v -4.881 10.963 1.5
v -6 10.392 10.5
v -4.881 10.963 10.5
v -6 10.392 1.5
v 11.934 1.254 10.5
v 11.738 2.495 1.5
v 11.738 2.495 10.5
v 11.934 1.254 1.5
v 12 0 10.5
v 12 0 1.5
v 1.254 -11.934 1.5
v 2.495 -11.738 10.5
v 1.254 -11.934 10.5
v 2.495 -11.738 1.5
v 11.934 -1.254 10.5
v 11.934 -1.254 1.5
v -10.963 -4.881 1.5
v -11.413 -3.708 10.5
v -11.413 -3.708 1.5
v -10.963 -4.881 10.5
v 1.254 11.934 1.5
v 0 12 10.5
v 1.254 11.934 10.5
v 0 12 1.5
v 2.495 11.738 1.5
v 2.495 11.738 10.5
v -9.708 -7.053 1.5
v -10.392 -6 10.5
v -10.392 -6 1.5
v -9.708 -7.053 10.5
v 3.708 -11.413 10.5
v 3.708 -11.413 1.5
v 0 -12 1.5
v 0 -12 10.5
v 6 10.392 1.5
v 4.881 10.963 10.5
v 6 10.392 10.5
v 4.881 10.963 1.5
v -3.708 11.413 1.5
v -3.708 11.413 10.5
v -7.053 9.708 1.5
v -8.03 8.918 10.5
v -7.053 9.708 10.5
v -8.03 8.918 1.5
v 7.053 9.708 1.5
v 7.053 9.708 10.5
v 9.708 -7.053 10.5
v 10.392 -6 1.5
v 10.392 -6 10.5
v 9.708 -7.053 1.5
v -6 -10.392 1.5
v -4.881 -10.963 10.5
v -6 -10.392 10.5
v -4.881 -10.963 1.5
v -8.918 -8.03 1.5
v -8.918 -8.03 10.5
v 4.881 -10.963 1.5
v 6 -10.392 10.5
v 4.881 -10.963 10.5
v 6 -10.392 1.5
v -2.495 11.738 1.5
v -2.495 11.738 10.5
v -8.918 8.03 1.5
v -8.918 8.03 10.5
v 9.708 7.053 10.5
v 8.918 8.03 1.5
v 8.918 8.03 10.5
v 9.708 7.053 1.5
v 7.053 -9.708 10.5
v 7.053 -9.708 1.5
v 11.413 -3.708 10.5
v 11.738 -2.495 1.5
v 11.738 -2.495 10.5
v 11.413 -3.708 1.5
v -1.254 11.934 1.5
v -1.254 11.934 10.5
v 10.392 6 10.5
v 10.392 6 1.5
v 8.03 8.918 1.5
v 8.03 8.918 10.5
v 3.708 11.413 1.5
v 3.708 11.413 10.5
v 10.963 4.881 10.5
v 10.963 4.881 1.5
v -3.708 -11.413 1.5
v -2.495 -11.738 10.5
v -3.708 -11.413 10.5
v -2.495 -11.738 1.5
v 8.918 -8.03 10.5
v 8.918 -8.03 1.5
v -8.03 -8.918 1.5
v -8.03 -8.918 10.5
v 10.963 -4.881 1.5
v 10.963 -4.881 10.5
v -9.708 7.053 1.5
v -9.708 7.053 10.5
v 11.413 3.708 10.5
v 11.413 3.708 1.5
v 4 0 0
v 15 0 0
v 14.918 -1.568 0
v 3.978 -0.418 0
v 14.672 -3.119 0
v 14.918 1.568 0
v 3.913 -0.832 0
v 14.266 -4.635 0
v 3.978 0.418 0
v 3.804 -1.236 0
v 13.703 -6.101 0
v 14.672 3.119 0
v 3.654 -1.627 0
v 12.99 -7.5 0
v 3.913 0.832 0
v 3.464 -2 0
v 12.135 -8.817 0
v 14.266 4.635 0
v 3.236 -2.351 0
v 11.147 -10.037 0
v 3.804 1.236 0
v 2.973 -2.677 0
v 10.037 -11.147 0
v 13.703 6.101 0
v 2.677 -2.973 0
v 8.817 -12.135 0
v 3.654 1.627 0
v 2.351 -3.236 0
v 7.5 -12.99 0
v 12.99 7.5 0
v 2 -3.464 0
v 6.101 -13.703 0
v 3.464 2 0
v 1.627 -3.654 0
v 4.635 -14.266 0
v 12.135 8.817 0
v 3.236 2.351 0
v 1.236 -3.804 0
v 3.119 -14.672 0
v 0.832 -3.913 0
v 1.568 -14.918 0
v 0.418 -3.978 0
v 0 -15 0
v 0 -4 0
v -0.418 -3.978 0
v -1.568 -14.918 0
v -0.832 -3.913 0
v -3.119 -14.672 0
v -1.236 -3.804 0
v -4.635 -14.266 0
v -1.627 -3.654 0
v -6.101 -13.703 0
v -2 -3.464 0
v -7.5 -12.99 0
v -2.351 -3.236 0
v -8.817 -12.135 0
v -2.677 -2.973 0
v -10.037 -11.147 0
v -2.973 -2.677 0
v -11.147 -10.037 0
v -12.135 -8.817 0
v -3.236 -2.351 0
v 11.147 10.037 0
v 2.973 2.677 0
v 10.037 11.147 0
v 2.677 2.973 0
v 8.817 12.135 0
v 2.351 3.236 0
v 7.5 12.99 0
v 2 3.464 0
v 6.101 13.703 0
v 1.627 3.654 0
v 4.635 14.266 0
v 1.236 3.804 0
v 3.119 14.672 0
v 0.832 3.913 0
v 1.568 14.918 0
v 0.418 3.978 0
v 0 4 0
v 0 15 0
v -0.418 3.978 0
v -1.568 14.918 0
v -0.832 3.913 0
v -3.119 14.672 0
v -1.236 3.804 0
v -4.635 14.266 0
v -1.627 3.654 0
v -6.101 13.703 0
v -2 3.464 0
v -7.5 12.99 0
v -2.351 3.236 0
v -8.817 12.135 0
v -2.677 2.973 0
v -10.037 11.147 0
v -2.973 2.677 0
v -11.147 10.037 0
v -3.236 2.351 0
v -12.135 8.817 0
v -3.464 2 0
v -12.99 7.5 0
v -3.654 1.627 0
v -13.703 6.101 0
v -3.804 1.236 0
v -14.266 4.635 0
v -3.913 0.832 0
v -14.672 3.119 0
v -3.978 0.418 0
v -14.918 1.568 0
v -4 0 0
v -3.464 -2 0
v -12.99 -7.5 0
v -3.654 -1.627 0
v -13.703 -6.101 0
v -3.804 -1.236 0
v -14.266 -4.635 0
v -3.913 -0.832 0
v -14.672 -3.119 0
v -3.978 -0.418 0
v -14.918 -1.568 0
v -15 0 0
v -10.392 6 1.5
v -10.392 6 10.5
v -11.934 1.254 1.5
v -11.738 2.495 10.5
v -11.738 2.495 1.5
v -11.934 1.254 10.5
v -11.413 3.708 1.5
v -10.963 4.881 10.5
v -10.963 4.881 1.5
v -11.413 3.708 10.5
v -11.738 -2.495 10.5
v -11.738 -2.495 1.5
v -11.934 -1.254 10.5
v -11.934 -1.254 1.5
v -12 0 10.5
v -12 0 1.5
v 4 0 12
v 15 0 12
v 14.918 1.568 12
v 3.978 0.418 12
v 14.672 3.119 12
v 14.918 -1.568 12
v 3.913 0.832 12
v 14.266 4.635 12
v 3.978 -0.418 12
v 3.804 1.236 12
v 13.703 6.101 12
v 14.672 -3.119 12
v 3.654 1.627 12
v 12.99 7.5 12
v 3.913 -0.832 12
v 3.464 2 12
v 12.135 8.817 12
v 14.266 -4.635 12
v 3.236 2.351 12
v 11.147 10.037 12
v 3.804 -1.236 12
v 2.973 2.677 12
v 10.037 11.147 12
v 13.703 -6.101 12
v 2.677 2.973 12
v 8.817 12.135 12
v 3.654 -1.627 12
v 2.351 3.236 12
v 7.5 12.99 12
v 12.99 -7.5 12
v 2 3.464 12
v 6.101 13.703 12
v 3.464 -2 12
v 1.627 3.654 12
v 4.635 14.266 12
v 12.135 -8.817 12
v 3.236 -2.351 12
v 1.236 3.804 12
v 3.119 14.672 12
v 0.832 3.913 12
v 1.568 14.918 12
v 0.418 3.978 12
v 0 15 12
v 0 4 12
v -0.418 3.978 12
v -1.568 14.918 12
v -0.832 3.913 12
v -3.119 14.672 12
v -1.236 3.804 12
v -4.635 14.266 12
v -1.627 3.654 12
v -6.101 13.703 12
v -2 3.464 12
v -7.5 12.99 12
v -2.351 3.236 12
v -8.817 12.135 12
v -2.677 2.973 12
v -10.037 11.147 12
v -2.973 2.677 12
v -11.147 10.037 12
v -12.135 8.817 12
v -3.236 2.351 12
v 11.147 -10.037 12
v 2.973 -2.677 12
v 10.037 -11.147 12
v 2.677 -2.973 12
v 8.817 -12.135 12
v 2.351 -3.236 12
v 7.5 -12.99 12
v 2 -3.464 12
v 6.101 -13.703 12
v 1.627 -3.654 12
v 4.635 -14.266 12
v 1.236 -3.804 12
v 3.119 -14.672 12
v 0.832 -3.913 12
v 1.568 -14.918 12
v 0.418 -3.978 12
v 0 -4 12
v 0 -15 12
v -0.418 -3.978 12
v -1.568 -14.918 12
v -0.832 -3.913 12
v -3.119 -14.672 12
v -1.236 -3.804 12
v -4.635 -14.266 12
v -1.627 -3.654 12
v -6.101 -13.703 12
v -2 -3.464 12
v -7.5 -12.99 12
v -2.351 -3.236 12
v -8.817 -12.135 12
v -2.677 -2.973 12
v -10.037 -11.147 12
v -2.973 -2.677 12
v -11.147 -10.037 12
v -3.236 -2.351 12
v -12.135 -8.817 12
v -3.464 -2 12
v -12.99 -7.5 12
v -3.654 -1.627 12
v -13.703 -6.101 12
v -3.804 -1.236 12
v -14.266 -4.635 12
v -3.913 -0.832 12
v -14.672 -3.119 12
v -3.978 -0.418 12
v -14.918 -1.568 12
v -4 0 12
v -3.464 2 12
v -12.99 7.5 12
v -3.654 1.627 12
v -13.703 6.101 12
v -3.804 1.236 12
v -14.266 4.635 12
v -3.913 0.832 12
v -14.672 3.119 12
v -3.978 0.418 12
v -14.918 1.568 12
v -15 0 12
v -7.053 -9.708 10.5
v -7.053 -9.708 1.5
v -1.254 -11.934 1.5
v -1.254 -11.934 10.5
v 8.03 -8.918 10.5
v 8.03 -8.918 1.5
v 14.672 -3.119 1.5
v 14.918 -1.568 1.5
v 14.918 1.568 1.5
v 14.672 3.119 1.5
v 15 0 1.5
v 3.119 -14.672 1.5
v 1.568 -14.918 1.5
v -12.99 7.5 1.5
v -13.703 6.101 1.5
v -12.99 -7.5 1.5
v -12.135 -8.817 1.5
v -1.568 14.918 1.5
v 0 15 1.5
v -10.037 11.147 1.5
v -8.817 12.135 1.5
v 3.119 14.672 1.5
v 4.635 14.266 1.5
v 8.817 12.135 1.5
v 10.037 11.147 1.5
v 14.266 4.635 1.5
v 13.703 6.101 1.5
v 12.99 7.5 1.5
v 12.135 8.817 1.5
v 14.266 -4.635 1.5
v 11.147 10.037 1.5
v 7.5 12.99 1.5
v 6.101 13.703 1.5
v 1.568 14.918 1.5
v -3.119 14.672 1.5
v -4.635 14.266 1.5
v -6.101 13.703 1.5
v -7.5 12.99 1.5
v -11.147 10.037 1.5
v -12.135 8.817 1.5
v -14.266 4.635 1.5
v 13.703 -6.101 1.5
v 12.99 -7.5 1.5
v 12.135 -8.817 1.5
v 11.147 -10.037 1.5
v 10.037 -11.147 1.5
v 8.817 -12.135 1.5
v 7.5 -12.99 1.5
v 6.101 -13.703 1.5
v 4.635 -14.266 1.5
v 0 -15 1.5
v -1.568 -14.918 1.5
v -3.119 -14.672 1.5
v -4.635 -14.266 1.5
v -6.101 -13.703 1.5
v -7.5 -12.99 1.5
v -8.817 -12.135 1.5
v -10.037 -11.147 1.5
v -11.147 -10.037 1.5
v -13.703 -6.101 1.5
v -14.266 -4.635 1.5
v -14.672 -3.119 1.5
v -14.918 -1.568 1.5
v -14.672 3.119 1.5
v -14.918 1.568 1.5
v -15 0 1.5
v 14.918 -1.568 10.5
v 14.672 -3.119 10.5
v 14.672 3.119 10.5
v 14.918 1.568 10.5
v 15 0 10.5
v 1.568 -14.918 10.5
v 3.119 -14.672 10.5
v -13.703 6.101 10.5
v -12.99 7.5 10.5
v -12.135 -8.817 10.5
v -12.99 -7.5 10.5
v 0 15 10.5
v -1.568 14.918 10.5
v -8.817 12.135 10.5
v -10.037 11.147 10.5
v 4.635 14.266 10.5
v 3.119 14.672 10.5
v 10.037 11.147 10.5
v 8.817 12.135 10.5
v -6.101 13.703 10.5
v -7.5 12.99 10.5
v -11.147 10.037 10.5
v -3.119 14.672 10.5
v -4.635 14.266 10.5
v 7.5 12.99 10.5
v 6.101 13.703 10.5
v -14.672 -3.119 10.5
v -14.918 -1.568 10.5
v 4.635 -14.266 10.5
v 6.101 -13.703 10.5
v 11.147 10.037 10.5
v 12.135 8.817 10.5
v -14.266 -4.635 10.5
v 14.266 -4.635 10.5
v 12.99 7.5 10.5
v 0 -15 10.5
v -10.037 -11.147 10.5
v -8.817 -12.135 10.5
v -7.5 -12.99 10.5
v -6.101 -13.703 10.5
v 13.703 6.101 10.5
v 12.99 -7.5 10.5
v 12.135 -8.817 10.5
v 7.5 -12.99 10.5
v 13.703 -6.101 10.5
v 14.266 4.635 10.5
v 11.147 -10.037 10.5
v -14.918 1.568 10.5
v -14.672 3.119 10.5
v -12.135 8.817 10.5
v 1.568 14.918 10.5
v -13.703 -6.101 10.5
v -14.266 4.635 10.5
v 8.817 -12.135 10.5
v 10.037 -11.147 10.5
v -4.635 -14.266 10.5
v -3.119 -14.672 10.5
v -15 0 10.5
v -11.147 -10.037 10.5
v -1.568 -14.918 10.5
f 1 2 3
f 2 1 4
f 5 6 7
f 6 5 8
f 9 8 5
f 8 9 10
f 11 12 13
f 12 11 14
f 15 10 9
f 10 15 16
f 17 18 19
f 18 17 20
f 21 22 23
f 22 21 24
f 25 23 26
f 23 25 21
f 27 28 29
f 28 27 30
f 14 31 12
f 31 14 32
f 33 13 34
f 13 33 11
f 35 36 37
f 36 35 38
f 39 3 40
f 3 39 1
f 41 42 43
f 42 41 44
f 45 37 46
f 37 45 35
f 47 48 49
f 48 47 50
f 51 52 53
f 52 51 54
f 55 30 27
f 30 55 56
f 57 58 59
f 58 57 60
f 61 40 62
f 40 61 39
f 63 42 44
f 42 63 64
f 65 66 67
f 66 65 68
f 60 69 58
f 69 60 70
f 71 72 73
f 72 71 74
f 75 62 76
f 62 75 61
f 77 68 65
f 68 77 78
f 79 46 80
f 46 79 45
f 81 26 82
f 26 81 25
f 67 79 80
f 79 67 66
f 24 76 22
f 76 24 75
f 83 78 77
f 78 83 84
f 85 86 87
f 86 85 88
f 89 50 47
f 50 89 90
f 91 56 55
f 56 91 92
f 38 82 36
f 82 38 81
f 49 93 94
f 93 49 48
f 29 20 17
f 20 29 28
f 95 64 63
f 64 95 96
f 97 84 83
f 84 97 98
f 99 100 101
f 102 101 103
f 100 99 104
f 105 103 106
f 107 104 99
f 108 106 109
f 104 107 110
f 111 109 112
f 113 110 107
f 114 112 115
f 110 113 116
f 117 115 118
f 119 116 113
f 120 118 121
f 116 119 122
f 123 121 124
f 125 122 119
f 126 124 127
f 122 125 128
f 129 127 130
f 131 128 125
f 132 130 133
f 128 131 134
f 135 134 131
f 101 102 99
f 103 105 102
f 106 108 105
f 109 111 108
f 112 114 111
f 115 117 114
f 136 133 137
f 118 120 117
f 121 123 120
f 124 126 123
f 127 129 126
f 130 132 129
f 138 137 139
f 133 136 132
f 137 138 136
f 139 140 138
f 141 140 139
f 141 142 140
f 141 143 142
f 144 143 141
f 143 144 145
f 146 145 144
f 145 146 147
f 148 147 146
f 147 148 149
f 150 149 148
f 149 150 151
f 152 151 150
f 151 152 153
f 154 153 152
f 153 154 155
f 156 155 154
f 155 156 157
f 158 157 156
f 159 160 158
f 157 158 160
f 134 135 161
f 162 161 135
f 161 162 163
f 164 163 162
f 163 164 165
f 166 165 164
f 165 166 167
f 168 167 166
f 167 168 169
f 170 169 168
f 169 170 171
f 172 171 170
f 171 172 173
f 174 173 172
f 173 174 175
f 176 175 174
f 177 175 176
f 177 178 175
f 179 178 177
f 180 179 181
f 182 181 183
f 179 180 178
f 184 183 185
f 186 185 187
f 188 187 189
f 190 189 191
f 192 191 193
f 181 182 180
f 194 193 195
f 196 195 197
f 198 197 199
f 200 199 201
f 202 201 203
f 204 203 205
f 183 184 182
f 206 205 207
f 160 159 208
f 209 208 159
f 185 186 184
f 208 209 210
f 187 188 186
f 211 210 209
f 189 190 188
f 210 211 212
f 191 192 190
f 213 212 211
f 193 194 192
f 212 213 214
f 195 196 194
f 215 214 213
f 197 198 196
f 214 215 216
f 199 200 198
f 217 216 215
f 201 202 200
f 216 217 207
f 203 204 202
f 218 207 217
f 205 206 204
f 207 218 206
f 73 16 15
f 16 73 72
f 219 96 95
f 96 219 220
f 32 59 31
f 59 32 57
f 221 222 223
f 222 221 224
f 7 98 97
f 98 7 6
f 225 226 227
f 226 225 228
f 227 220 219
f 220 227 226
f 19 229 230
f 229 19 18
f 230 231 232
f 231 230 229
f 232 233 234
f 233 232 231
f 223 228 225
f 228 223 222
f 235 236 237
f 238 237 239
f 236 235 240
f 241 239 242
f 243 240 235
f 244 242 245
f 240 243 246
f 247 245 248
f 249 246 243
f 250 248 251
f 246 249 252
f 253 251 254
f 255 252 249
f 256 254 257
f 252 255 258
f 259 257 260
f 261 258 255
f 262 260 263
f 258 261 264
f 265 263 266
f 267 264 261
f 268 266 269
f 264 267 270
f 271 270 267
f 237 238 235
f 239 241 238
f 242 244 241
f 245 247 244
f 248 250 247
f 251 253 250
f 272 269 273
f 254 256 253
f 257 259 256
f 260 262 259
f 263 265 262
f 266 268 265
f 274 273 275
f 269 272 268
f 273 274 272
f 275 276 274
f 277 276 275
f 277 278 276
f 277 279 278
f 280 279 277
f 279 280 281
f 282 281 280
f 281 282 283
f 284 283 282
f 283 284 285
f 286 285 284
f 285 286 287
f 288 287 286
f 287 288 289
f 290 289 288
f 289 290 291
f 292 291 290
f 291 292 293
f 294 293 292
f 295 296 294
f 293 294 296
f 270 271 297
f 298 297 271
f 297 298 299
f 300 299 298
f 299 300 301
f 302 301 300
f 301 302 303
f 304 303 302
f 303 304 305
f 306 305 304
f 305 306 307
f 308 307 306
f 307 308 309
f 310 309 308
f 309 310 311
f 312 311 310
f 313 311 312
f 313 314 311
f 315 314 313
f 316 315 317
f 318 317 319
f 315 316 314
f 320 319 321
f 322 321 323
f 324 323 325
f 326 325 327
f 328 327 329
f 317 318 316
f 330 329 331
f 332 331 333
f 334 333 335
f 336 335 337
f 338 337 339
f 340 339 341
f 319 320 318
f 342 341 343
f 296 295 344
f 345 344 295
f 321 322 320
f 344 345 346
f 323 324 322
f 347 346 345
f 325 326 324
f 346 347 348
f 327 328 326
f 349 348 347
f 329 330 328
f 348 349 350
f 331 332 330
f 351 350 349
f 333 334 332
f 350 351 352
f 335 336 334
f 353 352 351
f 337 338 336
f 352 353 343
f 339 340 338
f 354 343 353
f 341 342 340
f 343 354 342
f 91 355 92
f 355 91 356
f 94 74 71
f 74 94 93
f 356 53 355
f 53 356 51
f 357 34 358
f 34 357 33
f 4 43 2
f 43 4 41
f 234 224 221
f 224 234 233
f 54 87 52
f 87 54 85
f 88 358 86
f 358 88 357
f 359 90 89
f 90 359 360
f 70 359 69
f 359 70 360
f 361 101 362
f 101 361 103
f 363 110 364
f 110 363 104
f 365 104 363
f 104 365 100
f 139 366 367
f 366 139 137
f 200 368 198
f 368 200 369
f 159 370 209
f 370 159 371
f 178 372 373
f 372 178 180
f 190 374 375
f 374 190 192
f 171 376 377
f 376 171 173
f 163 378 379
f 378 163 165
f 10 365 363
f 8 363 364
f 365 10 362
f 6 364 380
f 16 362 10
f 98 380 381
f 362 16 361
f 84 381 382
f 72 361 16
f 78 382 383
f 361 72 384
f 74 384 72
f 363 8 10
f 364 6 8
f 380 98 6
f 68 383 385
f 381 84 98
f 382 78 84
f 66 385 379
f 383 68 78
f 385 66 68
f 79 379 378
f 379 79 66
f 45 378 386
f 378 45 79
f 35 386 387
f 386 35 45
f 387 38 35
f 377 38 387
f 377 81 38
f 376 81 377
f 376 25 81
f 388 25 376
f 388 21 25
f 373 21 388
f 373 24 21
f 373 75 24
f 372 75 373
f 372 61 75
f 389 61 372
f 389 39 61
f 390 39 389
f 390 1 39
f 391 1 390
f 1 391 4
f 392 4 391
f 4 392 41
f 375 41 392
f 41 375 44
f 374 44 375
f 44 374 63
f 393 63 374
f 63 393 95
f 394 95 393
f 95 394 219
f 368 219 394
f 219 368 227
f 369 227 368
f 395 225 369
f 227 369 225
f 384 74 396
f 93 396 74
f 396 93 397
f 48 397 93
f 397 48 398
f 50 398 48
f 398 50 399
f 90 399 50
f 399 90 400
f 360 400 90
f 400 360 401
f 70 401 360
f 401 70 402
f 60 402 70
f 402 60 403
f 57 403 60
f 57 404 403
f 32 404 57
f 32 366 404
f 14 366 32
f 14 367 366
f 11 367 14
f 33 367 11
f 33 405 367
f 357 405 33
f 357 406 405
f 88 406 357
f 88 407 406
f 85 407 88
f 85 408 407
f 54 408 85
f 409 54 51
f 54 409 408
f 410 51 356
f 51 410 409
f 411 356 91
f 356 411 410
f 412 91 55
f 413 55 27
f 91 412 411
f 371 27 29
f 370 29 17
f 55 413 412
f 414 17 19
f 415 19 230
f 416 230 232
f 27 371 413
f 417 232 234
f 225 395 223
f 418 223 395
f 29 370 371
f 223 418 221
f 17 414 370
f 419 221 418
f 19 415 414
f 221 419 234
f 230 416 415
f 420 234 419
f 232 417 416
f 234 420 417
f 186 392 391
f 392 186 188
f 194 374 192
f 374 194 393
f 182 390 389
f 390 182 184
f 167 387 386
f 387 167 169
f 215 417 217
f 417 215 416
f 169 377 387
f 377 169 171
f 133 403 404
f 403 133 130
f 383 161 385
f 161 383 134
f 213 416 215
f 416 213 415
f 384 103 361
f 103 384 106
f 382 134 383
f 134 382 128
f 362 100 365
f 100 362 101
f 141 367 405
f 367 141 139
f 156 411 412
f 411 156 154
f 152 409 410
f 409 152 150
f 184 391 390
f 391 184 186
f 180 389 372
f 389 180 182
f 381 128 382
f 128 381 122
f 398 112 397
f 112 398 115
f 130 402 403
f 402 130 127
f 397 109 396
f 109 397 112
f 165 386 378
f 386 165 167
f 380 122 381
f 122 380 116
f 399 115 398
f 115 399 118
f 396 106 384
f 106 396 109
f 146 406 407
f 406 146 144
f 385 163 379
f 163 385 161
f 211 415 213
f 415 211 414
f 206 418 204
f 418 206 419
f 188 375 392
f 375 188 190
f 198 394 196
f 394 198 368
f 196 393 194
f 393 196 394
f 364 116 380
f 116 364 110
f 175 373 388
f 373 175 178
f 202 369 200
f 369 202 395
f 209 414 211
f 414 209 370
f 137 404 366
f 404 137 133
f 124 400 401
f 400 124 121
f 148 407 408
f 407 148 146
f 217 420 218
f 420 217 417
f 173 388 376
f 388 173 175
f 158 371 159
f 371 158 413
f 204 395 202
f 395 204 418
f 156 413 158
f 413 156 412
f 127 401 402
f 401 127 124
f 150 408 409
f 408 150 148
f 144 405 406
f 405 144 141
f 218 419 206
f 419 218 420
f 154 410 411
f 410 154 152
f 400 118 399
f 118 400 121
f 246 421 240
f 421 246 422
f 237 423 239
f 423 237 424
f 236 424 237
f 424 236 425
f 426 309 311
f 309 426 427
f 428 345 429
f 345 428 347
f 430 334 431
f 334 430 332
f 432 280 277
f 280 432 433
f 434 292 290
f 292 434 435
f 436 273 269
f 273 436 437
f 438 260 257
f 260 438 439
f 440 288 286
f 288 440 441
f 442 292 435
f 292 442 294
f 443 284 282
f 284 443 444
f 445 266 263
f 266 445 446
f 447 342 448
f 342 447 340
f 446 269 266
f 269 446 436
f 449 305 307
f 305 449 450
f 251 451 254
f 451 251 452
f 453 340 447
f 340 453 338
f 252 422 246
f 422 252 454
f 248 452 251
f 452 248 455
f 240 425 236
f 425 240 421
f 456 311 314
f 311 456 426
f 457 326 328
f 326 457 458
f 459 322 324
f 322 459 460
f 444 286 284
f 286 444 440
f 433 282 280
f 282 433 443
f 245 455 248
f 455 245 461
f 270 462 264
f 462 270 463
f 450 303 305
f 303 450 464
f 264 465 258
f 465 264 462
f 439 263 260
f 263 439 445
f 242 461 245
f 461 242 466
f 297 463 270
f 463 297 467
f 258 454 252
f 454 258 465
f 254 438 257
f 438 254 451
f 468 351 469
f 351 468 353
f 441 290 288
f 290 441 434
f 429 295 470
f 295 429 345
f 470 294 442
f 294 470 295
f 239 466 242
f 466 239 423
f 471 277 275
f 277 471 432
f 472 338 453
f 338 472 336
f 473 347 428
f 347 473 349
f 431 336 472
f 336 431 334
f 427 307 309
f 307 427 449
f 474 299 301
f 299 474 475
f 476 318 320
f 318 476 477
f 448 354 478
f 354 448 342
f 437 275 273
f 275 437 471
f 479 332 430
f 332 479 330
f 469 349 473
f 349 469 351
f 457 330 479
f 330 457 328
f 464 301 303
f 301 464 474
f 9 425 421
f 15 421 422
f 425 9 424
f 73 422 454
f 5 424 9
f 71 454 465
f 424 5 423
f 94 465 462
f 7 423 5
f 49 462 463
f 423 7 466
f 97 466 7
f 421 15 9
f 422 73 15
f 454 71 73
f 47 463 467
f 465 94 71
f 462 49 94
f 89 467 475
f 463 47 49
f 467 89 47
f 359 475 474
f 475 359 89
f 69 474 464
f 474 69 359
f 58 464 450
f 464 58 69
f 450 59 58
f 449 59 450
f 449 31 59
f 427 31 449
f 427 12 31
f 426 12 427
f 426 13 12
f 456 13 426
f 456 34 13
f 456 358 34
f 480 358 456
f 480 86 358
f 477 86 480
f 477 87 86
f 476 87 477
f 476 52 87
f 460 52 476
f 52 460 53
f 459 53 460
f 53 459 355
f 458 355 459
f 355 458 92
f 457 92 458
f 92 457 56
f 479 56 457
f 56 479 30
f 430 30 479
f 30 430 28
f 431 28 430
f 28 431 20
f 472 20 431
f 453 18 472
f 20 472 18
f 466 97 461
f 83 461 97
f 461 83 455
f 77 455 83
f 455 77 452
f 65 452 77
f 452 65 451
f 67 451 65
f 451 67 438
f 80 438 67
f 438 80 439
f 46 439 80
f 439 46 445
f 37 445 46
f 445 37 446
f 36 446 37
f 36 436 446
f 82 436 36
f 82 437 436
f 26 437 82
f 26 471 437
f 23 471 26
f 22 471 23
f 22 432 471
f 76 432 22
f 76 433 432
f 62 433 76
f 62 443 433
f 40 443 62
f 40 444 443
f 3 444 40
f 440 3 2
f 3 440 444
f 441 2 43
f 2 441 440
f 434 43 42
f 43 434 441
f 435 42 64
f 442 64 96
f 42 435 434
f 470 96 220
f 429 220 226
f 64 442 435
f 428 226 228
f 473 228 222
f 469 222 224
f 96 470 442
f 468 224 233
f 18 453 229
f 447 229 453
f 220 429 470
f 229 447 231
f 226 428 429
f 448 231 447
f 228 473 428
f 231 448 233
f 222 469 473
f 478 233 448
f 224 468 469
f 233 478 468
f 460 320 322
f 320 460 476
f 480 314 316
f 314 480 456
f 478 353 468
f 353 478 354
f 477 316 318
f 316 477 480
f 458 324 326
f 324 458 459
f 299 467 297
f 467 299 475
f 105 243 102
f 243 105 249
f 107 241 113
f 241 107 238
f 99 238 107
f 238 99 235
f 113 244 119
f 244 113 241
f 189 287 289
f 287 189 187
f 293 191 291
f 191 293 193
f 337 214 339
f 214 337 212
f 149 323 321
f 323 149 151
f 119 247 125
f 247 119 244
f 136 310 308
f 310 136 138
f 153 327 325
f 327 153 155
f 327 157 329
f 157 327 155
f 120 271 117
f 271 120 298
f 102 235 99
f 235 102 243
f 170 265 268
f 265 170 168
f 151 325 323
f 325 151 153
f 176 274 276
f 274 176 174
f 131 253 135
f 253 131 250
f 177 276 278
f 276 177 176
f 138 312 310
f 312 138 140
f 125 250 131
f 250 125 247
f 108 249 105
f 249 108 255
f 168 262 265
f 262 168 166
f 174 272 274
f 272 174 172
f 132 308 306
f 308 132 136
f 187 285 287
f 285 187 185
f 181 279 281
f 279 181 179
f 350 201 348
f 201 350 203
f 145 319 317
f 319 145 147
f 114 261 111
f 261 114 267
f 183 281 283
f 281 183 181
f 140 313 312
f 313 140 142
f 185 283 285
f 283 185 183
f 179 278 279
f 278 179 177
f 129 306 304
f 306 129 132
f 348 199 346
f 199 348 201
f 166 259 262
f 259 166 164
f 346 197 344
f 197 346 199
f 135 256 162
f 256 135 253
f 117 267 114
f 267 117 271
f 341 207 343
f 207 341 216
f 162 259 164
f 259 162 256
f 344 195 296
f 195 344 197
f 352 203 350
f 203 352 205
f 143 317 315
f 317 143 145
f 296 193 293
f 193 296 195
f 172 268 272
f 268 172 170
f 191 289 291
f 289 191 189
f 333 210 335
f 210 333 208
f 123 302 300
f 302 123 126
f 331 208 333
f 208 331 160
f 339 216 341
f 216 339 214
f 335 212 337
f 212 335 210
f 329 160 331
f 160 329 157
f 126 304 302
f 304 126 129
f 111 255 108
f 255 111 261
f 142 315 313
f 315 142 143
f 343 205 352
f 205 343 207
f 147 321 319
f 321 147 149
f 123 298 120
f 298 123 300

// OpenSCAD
// Belt-guide pulley flange.
$fn = 60;
eps = 0.02;
bore_d = 8;
body_d = 24;
width = 12;
difference() { union() { cylinder(d=body_d,h=width); cylinder(d=body_d+6,h=1.5); translate([0,0,width-1.5]) cylinder(d=body_d+6,h=1.5); } translate([0,0,-eps]) cylinder(d=bore_d,h=width+2*eps); }
